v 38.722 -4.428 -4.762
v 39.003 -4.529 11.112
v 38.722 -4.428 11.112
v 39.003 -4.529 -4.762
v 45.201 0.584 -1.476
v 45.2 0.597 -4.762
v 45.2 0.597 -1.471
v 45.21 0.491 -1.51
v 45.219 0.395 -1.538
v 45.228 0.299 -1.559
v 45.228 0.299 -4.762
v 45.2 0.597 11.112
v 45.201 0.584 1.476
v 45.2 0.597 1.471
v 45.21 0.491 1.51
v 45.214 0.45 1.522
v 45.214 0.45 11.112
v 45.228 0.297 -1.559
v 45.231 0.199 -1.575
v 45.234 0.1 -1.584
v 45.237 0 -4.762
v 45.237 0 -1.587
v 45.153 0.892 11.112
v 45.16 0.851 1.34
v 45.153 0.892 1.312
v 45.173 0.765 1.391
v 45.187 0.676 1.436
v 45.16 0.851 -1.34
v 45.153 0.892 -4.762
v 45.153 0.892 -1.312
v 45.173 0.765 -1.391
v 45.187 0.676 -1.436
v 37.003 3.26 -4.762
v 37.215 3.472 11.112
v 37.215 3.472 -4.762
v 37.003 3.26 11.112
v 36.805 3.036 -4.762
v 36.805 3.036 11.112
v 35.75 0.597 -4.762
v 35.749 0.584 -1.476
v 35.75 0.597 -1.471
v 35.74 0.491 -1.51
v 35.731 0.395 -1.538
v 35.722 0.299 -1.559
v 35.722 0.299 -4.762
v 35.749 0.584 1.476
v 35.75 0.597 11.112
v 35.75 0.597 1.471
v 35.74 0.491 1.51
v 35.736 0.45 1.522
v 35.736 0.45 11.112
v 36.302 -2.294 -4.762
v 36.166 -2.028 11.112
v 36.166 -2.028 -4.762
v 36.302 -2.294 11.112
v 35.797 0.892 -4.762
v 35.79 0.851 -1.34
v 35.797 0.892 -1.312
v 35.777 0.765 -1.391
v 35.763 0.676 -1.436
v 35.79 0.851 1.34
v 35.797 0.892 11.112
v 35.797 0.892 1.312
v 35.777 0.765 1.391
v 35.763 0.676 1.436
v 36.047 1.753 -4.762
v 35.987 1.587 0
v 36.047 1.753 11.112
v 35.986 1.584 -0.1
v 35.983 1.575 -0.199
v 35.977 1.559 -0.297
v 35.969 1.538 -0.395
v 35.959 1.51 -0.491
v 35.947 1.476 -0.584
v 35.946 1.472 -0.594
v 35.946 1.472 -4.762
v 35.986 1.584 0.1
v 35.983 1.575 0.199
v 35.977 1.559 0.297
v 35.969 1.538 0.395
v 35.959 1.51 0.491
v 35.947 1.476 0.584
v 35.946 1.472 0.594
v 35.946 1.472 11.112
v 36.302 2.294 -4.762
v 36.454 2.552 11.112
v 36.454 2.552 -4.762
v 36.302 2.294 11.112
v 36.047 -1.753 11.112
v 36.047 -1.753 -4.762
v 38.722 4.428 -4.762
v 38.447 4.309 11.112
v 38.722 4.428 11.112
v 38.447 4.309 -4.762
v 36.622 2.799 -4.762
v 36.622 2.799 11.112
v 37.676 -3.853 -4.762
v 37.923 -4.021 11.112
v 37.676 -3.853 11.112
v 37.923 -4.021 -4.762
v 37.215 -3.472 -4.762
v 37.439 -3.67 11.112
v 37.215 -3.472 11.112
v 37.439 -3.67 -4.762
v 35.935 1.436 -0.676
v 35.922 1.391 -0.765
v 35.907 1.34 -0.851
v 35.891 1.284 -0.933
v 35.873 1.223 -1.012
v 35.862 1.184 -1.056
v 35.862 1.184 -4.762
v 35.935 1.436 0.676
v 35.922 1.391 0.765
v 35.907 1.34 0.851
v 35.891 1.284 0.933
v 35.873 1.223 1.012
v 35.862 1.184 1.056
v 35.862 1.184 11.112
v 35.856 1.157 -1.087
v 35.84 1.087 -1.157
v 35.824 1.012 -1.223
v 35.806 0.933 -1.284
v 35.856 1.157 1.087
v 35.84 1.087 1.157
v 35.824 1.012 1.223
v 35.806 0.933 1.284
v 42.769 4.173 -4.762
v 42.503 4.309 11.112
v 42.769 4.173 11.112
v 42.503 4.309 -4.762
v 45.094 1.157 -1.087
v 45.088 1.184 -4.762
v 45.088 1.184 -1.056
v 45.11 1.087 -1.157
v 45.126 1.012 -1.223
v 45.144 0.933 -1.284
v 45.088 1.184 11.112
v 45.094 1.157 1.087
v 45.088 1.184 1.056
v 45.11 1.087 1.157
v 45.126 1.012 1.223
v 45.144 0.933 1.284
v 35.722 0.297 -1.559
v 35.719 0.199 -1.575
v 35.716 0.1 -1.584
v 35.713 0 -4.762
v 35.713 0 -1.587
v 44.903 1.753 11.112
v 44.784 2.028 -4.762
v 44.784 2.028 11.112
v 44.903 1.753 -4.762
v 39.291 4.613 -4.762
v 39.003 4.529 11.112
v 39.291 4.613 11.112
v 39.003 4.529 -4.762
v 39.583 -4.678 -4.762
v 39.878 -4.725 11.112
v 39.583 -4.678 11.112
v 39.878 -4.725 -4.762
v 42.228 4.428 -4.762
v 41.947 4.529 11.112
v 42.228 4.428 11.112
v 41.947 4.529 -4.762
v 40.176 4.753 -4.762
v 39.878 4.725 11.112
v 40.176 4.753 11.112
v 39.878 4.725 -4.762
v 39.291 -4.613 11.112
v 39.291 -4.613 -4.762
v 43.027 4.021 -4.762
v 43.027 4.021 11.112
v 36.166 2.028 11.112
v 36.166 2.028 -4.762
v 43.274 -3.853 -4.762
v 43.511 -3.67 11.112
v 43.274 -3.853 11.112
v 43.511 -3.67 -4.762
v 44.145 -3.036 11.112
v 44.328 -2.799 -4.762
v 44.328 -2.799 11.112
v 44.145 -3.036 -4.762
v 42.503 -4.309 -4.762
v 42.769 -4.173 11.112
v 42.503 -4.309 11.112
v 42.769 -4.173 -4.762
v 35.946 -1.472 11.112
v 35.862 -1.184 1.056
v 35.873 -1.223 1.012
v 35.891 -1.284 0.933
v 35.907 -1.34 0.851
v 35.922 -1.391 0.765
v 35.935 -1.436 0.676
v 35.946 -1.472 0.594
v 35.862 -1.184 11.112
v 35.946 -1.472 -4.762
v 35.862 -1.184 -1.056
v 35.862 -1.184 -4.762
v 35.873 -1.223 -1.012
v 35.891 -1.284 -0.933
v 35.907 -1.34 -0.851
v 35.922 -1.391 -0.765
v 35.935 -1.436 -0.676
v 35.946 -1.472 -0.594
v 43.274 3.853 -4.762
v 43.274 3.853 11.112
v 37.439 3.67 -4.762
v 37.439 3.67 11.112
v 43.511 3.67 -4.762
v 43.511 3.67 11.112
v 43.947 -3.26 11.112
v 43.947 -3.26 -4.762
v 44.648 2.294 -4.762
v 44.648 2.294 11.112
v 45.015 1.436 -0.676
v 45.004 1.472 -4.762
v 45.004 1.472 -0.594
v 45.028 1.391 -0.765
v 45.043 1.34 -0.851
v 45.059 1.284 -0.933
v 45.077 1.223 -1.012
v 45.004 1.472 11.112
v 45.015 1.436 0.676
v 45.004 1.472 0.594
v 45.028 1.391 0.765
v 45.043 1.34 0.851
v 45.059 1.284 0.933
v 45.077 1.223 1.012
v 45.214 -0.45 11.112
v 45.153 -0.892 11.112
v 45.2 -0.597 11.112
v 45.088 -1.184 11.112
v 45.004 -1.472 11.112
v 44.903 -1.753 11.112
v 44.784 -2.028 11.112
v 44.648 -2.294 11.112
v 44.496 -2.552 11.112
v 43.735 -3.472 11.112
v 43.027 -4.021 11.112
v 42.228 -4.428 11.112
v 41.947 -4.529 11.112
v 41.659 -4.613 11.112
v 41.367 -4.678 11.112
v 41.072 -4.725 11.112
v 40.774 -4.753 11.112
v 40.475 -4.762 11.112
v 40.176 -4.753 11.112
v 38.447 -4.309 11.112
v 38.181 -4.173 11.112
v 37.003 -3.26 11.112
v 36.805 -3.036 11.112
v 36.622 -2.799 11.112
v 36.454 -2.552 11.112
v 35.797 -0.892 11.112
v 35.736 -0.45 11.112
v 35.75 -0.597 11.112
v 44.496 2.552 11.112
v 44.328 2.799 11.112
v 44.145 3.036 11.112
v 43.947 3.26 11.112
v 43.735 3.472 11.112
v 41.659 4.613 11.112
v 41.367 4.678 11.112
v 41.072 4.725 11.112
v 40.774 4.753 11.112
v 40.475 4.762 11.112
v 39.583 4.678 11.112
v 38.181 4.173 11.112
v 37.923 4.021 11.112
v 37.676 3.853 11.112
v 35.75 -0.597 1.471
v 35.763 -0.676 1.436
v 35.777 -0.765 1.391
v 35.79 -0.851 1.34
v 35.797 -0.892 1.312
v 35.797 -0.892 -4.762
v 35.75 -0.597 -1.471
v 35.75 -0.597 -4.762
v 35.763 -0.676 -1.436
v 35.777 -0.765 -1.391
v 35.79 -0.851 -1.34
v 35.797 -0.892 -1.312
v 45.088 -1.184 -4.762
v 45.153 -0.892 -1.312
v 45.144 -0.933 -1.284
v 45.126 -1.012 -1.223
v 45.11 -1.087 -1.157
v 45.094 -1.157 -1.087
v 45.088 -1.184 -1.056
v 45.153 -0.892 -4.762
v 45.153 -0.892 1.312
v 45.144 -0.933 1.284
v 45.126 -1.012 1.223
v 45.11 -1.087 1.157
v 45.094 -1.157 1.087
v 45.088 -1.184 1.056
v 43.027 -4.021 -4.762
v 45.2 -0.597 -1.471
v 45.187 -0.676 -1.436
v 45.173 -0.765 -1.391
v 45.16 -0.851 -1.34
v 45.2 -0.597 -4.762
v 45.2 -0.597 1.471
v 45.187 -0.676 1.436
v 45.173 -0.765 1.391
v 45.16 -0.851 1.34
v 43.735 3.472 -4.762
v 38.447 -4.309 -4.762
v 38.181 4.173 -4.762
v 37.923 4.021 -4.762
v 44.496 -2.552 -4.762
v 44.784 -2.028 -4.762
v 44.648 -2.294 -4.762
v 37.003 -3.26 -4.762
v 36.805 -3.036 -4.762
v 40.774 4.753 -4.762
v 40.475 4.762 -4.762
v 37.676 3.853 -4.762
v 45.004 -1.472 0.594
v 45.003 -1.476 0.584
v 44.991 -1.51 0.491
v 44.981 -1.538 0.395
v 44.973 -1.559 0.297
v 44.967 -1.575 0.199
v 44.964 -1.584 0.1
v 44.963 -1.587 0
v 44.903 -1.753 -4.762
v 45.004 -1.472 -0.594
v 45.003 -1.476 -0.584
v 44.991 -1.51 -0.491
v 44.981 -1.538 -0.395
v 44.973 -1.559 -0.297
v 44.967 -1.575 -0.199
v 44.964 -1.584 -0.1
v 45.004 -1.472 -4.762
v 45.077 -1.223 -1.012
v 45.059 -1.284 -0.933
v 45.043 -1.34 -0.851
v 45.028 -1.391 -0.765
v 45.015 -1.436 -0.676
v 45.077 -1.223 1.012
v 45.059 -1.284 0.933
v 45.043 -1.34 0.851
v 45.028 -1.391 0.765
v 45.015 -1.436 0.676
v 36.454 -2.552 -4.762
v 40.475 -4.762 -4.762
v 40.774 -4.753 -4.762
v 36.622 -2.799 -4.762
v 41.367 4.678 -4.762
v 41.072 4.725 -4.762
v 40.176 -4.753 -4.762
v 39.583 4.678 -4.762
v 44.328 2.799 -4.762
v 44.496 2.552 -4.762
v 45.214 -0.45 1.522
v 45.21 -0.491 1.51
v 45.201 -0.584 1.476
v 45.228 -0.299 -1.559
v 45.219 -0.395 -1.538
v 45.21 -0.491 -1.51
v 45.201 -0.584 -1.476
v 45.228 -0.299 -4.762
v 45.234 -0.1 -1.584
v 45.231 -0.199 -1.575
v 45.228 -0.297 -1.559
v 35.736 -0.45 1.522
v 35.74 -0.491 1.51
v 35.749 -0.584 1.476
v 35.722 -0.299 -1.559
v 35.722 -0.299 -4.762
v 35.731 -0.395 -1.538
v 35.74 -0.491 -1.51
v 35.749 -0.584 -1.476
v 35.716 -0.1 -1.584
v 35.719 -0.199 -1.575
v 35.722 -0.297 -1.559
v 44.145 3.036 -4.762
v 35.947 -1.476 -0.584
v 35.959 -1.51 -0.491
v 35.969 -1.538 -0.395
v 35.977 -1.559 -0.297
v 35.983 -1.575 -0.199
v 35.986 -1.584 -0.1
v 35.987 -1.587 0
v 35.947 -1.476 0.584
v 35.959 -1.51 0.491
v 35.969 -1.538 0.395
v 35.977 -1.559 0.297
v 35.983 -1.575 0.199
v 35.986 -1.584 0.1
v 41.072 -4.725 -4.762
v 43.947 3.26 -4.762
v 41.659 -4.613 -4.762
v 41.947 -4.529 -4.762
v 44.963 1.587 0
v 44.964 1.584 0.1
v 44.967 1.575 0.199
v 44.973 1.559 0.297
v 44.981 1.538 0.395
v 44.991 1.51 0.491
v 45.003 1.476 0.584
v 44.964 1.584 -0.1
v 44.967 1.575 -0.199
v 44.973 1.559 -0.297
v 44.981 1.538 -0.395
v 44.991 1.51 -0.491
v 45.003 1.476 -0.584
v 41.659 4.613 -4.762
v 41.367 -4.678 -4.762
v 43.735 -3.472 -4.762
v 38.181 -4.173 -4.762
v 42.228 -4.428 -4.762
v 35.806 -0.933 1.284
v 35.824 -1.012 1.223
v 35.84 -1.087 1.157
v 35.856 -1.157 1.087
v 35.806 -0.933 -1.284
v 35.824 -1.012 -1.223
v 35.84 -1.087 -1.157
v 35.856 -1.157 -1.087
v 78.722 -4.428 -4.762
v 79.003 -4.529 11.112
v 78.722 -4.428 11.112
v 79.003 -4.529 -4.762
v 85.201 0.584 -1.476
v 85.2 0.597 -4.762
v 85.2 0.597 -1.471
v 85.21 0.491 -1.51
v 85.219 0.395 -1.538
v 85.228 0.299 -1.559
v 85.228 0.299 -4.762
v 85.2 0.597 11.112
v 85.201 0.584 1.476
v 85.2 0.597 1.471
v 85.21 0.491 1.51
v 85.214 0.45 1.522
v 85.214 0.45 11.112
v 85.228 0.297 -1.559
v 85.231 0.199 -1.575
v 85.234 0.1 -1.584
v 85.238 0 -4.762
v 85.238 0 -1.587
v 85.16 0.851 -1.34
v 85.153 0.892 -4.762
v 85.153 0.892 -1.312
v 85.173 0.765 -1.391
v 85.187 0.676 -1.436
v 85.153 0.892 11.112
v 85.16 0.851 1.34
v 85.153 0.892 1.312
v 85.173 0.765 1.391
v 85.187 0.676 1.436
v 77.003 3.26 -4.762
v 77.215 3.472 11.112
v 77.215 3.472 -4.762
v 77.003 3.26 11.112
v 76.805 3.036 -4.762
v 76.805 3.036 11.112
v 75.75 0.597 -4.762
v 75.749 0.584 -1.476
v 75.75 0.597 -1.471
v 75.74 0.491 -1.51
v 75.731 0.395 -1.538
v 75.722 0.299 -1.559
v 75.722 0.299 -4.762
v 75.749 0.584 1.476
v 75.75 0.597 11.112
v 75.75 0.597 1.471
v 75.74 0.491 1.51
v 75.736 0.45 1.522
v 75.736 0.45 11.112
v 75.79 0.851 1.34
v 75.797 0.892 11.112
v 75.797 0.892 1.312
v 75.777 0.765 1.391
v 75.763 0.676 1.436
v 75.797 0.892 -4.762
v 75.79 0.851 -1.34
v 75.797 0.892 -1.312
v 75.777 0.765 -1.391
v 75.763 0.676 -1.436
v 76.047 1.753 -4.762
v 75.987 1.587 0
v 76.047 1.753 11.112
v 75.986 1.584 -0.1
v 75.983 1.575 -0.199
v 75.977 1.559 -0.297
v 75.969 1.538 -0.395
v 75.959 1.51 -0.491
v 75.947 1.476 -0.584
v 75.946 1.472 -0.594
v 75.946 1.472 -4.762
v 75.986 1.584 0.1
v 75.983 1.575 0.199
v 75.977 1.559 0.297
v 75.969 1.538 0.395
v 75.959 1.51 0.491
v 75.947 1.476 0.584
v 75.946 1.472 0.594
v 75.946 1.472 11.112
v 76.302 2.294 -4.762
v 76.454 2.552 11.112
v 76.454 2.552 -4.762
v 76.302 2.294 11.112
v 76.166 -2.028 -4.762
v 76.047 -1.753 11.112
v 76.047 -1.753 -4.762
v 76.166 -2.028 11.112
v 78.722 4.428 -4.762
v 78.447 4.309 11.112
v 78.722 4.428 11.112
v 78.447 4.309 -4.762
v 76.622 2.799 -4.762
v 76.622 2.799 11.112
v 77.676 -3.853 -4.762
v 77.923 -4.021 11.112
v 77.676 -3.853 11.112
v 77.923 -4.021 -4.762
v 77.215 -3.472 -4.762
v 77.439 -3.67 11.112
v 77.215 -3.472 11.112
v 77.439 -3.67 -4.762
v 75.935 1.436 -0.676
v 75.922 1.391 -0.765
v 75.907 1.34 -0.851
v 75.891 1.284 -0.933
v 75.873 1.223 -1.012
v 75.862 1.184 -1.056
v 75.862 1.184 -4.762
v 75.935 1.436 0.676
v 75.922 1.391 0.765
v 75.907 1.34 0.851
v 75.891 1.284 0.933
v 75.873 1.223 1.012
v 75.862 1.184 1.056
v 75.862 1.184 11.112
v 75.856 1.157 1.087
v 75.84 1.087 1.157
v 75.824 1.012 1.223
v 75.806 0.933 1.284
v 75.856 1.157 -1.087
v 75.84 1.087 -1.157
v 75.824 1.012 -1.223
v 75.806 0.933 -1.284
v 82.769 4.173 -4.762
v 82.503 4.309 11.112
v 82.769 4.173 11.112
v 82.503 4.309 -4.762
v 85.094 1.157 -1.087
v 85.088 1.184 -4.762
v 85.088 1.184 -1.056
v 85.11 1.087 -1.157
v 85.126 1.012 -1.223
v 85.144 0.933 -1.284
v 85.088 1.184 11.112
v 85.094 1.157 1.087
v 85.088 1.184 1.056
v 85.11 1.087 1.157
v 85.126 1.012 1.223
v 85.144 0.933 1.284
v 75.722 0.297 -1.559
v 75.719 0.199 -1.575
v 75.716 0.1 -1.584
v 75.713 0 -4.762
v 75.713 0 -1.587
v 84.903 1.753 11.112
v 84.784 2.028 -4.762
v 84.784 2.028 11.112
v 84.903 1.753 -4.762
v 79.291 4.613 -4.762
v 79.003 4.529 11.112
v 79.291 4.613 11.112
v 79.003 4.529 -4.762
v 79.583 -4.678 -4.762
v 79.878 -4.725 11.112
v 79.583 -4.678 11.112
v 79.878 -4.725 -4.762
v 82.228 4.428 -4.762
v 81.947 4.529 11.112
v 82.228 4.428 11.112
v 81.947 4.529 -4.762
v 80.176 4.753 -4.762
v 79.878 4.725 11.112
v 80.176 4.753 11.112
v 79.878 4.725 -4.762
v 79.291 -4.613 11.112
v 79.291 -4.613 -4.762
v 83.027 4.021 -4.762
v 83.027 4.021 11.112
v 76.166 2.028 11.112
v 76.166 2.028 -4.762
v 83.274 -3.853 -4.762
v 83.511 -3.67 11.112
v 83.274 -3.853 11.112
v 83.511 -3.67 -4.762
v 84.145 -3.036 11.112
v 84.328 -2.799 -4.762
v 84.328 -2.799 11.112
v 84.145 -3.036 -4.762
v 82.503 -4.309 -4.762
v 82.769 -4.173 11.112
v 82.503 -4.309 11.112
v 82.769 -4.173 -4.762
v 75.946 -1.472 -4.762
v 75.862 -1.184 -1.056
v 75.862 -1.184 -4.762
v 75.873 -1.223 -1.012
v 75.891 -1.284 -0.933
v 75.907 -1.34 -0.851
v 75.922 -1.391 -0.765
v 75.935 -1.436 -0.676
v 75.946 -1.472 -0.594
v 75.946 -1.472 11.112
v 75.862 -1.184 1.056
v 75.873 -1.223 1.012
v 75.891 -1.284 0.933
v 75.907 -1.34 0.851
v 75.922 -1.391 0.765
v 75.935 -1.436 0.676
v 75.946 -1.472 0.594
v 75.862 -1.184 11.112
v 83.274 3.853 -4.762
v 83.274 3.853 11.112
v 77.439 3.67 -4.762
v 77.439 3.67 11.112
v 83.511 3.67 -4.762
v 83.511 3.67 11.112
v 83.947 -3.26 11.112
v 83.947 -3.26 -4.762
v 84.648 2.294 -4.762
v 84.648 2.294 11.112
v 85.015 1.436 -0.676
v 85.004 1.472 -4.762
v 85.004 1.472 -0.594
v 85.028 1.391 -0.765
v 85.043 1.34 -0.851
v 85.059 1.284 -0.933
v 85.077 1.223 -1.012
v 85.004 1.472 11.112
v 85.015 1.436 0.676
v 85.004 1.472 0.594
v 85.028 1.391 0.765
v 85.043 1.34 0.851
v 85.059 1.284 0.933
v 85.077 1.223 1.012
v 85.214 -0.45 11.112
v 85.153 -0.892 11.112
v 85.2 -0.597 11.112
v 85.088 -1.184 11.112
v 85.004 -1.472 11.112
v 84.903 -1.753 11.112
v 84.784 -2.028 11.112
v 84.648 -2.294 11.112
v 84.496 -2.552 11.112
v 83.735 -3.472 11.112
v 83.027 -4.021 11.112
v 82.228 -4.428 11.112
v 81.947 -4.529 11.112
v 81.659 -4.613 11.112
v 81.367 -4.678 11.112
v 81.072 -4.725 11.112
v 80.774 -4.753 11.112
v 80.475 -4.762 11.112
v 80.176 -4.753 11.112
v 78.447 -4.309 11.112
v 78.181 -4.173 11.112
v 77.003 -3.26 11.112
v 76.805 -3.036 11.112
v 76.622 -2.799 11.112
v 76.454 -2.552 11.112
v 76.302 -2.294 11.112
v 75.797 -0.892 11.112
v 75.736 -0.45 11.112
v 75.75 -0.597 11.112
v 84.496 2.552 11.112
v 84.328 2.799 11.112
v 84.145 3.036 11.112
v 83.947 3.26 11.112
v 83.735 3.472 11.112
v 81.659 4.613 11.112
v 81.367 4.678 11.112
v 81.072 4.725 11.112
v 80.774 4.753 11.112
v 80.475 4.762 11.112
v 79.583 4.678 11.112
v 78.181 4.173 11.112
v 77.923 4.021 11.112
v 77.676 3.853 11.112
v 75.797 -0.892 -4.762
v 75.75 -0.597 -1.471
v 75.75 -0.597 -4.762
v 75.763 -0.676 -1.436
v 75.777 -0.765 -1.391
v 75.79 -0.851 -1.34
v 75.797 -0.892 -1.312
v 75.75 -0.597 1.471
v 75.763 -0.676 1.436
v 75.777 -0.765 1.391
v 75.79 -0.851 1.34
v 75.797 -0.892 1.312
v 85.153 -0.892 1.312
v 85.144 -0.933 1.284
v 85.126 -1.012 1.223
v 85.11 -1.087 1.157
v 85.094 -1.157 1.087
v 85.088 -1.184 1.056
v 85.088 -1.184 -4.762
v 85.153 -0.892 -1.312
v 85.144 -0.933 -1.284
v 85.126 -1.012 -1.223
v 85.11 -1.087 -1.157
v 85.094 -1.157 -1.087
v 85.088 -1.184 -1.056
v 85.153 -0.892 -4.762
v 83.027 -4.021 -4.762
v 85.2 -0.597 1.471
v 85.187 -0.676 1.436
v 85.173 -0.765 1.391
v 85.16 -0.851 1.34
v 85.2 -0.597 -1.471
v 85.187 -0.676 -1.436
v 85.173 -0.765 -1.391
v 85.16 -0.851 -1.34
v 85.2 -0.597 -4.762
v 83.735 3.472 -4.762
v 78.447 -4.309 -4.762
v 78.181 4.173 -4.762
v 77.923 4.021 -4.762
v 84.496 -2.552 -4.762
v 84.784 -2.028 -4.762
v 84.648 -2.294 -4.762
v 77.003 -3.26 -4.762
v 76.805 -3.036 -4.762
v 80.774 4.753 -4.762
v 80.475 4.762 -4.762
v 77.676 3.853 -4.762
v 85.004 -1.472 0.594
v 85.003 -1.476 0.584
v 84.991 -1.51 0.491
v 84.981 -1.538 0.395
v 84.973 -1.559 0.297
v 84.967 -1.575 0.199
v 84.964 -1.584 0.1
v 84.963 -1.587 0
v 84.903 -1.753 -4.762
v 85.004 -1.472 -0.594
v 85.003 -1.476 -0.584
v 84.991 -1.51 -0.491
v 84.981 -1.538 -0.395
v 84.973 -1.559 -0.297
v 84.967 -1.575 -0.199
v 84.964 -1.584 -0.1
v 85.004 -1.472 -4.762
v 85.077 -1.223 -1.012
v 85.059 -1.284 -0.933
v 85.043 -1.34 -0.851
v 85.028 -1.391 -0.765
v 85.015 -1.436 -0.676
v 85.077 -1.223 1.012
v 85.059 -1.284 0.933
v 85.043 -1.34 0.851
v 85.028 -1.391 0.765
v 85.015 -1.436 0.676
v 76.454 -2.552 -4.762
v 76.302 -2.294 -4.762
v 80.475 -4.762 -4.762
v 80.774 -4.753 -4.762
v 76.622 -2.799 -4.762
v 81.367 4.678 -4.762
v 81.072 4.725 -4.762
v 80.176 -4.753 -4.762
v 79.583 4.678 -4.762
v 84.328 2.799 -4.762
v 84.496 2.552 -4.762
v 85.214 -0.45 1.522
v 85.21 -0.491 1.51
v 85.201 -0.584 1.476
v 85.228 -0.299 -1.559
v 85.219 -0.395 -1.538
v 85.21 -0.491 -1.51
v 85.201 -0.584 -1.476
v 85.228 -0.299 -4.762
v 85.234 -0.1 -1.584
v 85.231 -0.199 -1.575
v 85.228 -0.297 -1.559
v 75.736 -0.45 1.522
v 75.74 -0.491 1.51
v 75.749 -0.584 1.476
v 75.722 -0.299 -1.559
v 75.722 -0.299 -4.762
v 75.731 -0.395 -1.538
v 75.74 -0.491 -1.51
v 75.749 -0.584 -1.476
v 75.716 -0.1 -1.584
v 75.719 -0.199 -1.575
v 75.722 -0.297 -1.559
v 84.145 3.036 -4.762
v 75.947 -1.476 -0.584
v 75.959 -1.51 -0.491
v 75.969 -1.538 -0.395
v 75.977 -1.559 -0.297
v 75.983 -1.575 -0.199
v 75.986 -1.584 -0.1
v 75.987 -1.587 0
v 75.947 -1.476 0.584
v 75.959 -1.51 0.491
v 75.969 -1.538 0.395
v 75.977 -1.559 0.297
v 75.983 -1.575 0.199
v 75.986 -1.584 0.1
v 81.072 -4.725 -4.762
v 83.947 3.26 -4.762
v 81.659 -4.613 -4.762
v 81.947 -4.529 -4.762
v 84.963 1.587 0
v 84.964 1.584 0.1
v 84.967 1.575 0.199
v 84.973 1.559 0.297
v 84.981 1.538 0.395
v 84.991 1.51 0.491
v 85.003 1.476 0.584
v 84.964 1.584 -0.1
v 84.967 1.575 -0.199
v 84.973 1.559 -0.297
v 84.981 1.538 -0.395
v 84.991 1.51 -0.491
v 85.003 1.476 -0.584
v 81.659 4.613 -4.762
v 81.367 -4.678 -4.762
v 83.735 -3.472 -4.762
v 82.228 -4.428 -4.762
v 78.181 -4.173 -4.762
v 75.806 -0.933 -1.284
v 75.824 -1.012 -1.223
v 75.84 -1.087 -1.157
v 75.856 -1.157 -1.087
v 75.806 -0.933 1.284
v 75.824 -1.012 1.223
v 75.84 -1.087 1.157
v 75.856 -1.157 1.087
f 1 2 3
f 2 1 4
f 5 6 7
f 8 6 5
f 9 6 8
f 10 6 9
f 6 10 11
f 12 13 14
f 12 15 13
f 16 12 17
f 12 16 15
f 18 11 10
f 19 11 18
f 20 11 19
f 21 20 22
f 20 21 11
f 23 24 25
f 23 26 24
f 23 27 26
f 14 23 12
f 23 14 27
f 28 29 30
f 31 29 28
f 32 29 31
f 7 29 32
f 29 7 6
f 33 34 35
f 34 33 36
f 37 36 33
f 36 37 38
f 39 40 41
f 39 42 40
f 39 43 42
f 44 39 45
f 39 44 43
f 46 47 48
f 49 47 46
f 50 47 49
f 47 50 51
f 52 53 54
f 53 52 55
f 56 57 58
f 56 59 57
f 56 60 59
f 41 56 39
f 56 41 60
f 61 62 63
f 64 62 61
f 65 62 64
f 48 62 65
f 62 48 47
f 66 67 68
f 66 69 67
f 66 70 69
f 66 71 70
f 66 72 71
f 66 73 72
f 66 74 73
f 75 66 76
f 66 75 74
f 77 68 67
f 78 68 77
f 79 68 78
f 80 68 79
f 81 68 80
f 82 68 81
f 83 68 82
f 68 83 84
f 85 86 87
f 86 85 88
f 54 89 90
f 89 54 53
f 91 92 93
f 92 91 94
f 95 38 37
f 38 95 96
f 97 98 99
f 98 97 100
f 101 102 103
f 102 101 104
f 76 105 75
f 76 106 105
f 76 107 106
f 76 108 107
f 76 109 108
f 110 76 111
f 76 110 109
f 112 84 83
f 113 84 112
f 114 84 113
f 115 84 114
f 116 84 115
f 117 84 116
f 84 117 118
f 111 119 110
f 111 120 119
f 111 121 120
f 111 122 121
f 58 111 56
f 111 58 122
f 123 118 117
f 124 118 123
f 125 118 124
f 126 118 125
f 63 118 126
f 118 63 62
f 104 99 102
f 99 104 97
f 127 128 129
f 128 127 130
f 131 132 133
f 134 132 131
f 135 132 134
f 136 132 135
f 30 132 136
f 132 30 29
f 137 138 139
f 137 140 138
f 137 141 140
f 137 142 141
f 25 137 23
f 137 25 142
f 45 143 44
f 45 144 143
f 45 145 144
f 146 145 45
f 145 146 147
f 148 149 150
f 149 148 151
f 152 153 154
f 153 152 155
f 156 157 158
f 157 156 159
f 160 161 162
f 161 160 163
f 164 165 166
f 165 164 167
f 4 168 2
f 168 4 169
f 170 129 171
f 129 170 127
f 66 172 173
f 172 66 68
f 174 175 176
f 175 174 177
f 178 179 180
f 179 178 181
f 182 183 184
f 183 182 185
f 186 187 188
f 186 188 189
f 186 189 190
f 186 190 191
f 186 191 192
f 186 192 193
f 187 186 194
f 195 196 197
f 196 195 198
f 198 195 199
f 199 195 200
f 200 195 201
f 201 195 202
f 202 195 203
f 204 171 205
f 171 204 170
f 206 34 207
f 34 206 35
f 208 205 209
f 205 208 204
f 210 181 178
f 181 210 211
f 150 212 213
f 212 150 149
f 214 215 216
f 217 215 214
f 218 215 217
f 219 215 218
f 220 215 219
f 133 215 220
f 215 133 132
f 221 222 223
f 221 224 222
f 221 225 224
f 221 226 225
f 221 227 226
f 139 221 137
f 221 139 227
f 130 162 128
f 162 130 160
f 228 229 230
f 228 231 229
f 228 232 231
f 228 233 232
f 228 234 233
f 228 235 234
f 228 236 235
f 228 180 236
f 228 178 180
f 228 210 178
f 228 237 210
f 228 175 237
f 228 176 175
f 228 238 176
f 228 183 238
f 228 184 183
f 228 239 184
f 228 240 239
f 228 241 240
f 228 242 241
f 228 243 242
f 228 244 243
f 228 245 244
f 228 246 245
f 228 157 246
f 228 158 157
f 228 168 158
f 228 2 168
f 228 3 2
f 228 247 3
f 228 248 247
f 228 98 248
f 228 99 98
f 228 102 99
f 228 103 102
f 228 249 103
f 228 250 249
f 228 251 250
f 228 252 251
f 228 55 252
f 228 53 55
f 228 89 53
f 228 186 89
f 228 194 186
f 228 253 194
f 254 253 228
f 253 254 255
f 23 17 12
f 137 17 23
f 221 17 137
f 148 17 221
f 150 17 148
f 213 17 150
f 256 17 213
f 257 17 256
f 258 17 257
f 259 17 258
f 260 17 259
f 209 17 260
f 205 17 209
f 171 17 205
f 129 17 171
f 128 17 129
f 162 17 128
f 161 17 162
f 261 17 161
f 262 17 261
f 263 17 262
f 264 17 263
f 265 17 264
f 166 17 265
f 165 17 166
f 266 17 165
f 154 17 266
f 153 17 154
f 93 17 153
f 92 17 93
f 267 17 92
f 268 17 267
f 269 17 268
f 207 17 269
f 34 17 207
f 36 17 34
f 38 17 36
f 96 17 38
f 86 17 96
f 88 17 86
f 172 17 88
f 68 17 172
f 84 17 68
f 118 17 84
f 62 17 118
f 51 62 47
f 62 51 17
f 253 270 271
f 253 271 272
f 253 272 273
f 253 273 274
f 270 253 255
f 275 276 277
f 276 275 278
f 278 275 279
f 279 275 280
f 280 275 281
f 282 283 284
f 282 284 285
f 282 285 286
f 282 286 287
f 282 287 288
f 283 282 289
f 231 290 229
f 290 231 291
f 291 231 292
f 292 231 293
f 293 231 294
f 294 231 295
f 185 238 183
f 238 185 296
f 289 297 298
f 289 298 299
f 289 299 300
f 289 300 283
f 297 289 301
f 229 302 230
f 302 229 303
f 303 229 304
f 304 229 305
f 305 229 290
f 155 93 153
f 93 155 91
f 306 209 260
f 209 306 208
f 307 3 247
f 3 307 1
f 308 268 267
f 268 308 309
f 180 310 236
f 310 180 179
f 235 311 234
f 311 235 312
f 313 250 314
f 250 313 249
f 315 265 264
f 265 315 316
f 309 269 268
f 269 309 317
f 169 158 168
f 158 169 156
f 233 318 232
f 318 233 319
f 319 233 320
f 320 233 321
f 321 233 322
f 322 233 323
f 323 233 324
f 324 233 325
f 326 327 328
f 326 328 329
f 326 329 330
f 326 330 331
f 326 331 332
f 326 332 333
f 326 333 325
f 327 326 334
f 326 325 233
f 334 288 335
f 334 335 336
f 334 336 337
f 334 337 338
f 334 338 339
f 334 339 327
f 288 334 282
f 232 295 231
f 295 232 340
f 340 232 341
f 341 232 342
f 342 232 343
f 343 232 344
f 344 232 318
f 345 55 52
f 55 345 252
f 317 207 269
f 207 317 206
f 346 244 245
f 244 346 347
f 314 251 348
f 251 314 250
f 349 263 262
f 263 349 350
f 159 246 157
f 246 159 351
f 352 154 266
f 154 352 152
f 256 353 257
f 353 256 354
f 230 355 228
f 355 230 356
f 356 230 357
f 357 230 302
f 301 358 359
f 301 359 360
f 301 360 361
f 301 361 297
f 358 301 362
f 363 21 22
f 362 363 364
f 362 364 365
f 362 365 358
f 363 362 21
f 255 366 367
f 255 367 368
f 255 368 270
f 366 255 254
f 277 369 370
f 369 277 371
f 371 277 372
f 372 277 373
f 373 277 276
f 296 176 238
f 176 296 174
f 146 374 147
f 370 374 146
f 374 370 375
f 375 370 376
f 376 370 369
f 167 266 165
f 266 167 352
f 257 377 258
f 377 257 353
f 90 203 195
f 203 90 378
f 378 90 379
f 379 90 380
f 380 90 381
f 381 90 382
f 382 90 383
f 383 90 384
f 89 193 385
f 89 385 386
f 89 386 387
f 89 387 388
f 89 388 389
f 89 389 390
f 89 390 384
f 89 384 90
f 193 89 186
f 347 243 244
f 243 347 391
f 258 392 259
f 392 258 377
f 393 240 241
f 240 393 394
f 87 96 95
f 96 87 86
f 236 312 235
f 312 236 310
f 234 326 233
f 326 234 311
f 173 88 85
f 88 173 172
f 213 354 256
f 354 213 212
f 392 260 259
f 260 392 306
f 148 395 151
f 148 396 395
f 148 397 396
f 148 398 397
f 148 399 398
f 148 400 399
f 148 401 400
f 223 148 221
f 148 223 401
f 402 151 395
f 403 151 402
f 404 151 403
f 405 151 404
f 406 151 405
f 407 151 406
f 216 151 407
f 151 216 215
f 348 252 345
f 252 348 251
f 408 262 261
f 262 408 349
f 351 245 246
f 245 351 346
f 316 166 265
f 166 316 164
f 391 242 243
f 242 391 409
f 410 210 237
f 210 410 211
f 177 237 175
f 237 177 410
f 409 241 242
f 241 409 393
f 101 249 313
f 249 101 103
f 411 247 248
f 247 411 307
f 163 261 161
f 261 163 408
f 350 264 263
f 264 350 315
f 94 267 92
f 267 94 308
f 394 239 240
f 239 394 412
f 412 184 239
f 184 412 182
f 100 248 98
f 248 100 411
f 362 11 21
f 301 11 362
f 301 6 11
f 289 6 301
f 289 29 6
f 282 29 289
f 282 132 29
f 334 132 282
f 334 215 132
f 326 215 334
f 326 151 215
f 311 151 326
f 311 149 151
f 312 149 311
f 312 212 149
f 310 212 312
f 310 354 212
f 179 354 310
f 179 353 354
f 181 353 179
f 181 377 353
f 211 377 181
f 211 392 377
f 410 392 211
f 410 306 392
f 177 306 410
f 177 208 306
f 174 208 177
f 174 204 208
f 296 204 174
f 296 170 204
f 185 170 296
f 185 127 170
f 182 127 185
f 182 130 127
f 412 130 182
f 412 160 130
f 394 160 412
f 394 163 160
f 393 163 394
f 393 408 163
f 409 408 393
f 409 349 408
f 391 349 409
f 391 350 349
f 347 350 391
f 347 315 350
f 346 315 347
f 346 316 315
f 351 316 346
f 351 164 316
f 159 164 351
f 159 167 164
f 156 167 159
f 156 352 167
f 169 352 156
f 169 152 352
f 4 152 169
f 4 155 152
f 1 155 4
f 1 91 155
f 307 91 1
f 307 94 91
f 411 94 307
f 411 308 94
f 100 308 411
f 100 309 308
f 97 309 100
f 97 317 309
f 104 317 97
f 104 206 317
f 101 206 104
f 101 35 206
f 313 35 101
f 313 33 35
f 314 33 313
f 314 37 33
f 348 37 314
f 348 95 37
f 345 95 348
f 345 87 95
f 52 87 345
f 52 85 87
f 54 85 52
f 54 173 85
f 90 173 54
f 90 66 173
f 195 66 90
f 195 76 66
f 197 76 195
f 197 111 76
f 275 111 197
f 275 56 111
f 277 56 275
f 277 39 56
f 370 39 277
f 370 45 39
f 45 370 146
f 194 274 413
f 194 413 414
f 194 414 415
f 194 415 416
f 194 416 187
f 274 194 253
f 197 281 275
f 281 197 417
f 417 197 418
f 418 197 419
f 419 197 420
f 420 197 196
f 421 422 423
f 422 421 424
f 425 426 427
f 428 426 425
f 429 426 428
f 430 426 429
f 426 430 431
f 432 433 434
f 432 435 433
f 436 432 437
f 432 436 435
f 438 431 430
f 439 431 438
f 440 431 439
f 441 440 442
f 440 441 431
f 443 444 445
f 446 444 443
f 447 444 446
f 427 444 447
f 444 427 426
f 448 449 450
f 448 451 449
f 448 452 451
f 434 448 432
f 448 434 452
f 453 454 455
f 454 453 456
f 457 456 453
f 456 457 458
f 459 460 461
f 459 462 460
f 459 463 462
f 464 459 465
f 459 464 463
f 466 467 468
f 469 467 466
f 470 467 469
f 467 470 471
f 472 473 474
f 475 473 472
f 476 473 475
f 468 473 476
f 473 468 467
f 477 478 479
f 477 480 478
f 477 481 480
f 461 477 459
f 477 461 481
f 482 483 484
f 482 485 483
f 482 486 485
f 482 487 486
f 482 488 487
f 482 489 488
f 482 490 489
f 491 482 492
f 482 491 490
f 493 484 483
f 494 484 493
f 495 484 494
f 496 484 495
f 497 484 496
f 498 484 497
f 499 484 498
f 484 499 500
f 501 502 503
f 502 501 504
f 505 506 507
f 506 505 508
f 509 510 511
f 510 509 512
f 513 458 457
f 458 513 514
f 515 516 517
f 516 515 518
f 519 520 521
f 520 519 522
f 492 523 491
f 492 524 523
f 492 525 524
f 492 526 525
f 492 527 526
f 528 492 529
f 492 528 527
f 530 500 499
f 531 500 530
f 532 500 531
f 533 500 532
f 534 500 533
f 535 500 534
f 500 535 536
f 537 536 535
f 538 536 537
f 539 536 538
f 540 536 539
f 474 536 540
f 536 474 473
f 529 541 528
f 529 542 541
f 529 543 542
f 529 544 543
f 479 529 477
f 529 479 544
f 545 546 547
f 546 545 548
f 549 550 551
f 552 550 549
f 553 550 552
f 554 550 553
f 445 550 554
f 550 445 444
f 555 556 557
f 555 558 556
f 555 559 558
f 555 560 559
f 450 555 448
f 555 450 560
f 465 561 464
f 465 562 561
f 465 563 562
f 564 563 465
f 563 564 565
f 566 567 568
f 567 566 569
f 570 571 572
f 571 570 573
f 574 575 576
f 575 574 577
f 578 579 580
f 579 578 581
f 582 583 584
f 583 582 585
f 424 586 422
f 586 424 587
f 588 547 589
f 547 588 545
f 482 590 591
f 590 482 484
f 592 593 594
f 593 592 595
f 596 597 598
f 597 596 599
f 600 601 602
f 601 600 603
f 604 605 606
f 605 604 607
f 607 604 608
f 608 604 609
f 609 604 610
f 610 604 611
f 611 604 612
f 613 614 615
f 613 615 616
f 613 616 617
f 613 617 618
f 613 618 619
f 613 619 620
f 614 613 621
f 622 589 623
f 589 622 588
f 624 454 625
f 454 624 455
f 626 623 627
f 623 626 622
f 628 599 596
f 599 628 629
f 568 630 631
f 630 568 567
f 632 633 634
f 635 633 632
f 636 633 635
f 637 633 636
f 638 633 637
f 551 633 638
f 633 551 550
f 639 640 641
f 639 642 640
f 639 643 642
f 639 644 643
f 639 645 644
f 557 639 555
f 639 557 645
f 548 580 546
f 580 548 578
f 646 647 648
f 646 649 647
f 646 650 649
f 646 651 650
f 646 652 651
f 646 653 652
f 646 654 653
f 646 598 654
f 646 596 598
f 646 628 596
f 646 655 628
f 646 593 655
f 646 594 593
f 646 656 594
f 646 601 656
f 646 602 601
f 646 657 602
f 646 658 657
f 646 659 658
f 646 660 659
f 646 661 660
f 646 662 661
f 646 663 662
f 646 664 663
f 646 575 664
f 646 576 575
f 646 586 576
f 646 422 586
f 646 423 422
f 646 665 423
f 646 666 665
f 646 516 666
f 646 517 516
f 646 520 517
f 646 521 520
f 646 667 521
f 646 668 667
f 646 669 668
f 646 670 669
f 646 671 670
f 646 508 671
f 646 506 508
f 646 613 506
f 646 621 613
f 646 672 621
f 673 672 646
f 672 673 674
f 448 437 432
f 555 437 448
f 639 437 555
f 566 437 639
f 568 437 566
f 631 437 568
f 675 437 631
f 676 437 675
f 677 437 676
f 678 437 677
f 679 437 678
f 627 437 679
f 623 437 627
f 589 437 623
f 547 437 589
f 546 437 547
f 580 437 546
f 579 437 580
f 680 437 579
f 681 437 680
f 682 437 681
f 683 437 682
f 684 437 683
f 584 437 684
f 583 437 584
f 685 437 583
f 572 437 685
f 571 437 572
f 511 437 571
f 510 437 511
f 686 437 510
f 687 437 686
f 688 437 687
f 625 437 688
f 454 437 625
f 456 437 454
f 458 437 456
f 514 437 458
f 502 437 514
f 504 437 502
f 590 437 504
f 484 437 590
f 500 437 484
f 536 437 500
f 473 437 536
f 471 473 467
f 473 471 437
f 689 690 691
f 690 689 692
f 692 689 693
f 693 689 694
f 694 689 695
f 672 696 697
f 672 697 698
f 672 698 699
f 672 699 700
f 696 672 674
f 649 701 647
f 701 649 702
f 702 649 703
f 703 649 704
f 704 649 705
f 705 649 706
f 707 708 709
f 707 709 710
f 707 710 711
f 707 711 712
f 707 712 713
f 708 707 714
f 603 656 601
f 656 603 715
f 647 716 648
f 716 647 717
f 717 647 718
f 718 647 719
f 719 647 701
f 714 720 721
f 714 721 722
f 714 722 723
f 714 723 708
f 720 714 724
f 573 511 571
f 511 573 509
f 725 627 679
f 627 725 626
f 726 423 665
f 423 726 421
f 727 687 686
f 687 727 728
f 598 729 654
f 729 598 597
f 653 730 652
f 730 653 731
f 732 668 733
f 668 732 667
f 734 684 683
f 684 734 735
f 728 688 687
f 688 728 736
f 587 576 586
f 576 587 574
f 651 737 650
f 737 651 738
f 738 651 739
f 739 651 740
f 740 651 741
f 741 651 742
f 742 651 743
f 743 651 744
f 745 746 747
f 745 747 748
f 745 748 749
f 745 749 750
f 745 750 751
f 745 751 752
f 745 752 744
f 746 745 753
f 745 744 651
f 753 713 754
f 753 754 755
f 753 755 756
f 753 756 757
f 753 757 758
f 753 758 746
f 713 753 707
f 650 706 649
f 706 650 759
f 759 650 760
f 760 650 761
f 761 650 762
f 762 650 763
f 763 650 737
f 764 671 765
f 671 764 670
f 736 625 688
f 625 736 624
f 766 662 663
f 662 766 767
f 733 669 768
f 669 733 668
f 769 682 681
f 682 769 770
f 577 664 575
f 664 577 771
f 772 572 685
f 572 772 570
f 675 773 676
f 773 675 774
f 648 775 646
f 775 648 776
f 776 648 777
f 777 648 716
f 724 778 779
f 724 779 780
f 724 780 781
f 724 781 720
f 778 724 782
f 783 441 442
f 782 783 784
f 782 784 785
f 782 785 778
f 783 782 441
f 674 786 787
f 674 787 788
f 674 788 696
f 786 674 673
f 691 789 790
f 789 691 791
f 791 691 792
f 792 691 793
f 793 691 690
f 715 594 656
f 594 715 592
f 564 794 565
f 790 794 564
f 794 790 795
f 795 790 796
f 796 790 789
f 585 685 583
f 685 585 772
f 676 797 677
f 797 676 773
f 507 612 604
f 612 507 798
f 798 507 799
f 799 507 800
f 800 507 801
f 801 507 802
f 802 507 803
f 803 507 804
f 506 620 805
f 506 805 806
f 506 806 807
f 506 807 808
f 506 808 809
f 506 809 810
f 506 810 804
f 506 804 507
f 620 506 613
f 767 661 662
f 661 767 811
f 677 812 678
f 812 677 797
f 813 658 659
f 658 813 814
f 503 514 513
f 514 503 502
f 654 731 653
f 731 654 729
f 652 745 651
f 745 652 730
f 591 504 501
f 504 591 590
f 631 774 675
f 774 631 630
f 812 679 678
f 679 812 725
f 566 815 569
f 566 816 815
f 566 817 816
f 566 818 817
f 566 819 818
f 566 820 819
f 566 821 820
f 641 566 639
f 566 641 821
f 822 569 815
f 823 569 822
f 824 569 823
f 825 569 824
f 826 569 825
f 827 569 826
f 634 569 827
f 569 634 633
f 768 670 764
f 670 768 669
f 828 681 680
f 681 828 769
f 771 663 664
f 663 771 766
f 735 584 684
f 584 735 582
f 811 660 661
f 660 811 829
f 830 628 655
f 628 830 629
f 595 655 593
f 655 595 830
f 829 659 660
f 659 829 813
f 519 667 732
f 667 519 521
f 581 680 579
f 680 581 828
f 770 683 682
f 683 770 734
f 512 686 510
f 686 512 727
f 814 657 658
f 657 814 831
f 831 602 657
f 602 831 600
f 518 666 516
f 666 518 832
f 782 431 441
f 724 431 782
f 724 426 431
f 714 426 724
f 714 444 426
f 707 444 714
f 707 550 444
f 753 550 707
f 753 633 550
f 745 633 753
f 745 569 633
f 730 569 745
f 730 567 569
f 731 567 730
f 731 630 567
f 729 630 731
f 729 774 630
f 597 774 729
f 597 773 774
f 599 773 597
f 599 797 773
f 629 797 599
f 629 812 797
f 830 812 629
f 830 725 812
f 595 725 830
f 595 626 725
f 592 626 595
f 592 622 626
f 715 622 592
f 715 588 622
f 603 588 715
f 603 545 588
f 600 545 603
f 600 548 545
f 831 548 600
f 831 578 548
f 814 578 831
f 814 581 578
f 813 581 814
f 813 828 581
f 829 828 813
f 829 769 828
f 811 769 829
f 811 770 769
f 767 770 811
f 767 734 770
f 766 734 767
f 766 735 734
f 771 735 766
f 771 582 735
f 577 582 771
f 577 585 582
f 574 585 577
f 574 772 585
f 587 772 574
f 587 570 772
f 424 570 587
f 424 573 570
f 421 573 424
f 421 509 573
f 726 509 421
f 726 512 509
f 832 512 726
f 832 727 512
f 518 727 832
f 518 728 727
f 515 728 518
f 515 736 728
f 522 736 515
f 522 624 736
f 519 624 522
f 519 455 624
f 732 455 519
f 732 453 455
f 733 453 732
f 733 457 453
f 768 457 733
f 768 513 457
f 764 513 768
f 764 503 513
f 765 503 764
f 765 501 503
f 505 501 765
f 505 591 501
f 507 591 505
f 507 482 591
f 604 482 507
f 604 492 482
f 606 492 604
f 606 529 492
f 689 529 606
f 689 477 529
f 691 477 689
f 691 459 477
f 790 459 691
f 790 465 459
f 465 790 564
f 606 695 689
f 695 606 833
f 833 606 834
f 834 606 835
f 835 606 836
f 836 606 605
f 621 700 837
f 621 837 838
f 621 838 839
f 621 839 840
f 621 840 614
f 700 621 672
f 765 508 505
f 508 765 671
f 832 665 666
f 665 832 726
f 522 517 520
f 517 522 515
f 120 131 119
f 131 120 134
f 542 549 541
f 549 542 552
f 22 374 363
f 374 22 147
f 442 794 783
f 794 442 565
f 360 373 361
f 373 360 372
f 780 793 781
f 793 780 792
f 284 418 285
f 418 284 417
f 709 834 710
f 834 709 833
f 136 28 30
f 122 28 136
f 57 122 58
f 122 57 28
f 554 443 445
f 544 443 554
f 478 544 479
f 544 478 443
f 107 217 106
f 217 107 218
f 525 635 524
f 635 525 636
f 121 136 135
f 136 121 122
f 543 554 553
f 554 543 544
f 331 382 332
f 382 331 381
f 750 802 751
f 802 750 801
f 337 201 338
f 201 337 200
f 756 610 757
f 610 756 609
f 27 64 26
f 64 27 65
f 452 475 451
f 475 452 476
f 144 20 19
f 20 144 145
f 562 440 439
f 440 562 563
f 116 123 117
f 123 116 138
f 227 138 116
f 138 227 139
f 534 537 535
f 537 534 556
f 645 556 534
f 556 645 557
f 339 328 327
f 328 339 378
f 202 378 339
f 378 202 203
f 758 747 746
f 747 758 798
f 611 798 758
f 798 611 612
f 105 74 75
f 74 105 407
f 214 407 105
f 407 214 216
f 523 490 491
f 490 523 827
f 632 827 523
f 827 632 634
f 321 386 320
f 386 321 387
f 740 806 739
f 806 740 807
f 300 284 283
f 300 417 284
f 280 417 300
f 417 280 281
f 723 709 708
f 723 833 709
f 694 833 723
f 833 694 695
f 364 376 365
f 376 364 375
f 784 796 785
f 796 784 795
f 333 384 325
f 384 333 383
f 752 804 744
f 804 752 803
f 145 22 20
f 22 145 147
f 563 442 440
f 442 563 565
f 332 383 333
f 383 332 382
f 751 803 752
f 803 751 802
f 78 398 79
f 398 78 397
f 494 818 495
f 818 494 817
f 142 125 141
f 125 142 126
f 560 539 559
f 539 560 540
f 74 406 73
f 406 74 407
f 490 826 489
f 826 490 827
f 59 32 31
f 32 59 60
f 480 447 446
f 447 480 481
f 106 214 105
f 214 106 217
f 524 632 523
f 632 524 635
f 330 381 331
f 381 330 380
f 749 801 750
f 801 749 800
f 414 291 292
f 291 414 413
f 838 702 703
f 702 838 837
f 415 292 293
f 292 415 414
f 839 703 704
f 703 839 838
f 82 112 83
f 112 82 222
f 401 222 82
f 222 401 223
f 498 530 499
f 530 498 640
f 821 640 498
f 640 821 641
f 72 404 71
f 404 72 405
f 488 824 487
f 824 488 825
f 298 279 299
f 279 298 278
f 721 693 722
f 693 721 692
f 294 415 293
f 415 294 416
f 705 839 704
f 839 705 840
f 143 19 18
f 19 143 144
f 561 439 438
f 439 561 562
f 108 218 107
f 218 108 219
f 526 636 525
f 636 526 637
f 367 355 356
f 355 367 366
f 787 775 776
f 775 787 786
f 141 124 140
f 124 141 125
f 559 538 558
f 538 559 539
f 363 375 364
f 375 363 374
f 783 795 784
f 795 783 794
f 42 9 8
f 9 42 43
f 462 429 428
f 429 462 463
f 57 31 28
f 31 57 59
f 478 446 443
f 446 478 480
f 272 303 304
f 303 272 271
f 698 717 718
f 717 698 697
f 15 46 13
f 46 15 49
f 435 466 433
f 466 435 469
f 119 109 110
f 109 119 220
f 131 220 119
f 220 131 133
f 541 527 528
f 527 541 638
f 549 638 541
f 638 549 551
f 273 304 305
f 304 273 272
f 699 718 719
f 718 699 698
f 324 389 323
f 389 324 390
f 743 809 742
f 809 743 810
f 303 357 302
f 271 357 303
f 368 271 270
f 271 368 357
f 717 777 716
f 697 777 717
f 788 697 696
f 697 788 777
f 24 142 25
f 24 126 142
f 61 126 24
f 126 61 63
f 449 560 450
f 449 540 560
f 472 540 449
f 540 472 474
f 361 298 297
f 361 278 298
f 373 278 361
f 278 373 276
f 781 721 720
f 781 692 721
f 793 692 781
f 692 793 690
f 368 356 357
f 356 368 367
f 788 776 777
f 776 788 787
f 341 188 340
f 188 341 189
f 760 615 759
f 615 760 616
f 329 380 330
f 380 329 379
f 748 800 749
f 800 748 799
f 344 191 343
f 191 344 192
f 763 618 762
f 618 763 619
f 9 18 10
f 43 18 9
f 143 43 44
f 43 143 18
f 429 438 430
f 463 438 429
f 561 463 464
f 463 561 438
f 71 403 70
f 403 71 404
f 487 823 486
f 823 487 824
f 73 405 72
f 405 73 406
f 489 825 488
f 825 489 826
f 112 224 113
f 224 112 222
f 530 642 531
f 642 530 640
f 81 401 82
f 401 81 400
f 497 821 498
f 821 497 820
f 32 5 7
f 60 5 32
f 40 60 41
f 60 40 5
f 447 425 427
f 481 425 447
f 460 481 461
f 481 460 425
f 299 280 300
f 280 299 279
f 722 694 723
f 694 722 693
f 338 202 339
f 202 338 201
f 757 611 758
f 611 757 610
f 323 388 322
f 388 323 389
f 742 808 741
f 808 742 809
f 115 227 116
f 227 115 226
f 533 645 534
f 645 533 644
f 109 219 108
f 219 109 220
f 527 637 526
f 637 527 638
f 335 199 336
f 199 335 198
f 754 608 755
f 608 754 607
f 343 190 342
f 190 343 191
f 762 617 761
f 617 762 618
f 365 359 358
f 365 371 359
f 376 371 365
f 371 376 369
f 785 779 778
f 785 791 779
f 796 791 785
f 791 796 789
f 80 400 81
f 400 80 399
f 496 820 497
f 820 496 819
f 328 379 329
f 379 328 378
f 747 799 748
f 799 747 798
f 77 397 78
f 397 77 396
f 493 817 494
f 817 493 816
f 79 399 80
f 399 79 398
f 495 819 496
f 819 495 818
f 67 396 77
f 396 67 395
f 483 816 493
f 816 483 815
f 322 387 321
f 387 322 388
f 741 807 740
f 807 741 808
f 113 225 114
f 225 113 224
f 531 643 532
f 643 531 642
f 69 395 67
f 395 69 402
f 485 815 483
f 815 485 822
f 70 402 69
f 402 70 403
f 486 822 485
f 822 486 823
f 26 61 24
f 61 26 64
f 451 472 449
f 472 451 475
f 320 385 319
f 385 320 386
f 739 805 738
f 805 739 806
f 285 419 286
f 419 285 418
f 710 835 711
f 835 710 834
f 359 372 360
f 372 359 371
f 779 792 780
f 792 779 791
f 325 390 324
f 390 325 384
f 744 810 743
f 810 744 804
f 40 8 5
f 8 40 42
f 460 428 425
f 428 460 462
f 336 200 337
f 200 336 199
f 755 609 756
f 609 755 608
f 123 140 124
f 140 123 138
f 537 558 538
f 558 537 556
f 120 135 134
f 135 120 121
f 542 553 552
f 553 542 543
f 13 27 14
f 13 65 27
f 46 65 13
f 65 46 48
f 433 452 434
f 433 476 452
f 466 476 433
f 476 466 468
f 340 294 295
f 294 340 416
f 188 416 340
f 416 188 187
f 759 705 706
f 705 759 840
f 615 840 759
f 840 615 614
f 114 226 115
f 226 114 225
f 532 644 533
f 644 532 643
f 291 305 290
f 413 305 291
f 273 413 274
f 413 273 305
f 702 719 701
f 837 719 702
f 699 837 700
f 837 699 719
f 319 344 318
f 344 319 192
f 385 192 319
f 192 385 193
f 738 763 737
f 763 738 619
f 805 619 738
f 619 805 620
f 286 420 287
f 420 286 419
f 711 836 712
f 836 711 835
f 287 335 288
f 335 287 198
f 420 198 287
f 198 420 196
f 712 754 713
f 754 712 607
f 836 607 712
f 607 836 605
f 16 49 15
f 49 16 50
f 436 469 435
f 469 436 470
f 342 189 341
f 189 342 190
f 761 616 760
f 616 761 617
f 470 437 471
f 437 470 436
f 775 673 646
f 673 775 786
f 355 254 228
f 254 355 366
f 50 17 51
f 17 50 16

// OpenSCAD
// This version of the wind vane uses a carbon fiber backbone and a delrin vane for it's
// main components, and a 3D printed shaft coupling and counterweight. To be honest, the
// 3D printed parts probably aren't needed. But it's fun and easy.

// I've also thrown in some vane holders to make glueing easier.

pointyEndLength=120;
vaneEndLength=90;
vaneHeight=60;
vaneStraightLength=20;
backboneDiameter=3.175; // 0.125 in
vaneThickness=0.9; // Nominally 0.78, ~0.31 in
vaneRiseDistance=60;

shaftDiameter=3.175;
shaftMatingLength=8;
shaftWallThickness=1.5;

vaneBracketHeight=backboneDiameter*5;
vaneBracketDiameter=backboneDiameter*3;

counterweightLeadingDiameter=8;
counterweightLength=45;
counterweightPosition=-pointyEndLength;

vaneBracketPositions=[
    vaneEndLength-vaneBracketDiameter-vaneStraightLength-vaneRiseDistance/3, 
    vaneEndLength-vaneBracketDiameter
];

module triangle(o_len, a_len, depth){
    linear_extrude(height=depth){
        polygon(points=[[0,0], [a_len, 0], [0, o_len]], paths=[[0,1,2]]);
    }
}

$fn = 100;


difference(){
    union(){
        
        // Teardrop
        %translate([counterweightPosition, 0, 0]) rotate([90, 0, 90]) hull() {
            sphere(r=counterweightLeadingDiameter);
            cylinder(h = counterweightLength, r1 = 5, r2 = 0);
        }
        
        // Vane brackets
        for(pos=vaneBracketPositions){
            translate([pos, 0, -vaneBracketDiameter/2]) cylinder(h=vaneBracketHeight, d=vaneBracketDiameter);
        }
        
        // axis shaft shell
        %translate([0,0,-shaftMatingLength-backboneDiameter/2+shaftWallThickness]) cylinder(h=shaftMatingLength+backboneDiameter/2+shaftWallThickness , d=shaftDiameter+2*shaftWallThickness);

    }
    
    // Shaft
    #translate([0,0,-shaftMatingLength-backboneDiameter/2]) cylinder(h=shaftMatingLength+backboneDiameter/2, d=shaftDiameter);
    
    // Backbone
    #translate([-pointyEndLength, 0, 0]) rotate([0, 90, 0]) cylinder(h=pointyEndLength + vaneEndLength, d=backboneDiameter);
    
    // Vane straight portion
    #translate([vaneEndLength - vaneStraightLength, -vaneThickness/2, 0]) cube([vaneStraightLength, vaneThickness, vaneHeight]);

    // Vane sloped portion
    #translate([vaneEndLength - vaneStraightLength, -vaneThickness/2, 0]) rotate([90, 0, 180]) triangle(vaneHeight, vaneRiseDistance, vaneThickness);
}
